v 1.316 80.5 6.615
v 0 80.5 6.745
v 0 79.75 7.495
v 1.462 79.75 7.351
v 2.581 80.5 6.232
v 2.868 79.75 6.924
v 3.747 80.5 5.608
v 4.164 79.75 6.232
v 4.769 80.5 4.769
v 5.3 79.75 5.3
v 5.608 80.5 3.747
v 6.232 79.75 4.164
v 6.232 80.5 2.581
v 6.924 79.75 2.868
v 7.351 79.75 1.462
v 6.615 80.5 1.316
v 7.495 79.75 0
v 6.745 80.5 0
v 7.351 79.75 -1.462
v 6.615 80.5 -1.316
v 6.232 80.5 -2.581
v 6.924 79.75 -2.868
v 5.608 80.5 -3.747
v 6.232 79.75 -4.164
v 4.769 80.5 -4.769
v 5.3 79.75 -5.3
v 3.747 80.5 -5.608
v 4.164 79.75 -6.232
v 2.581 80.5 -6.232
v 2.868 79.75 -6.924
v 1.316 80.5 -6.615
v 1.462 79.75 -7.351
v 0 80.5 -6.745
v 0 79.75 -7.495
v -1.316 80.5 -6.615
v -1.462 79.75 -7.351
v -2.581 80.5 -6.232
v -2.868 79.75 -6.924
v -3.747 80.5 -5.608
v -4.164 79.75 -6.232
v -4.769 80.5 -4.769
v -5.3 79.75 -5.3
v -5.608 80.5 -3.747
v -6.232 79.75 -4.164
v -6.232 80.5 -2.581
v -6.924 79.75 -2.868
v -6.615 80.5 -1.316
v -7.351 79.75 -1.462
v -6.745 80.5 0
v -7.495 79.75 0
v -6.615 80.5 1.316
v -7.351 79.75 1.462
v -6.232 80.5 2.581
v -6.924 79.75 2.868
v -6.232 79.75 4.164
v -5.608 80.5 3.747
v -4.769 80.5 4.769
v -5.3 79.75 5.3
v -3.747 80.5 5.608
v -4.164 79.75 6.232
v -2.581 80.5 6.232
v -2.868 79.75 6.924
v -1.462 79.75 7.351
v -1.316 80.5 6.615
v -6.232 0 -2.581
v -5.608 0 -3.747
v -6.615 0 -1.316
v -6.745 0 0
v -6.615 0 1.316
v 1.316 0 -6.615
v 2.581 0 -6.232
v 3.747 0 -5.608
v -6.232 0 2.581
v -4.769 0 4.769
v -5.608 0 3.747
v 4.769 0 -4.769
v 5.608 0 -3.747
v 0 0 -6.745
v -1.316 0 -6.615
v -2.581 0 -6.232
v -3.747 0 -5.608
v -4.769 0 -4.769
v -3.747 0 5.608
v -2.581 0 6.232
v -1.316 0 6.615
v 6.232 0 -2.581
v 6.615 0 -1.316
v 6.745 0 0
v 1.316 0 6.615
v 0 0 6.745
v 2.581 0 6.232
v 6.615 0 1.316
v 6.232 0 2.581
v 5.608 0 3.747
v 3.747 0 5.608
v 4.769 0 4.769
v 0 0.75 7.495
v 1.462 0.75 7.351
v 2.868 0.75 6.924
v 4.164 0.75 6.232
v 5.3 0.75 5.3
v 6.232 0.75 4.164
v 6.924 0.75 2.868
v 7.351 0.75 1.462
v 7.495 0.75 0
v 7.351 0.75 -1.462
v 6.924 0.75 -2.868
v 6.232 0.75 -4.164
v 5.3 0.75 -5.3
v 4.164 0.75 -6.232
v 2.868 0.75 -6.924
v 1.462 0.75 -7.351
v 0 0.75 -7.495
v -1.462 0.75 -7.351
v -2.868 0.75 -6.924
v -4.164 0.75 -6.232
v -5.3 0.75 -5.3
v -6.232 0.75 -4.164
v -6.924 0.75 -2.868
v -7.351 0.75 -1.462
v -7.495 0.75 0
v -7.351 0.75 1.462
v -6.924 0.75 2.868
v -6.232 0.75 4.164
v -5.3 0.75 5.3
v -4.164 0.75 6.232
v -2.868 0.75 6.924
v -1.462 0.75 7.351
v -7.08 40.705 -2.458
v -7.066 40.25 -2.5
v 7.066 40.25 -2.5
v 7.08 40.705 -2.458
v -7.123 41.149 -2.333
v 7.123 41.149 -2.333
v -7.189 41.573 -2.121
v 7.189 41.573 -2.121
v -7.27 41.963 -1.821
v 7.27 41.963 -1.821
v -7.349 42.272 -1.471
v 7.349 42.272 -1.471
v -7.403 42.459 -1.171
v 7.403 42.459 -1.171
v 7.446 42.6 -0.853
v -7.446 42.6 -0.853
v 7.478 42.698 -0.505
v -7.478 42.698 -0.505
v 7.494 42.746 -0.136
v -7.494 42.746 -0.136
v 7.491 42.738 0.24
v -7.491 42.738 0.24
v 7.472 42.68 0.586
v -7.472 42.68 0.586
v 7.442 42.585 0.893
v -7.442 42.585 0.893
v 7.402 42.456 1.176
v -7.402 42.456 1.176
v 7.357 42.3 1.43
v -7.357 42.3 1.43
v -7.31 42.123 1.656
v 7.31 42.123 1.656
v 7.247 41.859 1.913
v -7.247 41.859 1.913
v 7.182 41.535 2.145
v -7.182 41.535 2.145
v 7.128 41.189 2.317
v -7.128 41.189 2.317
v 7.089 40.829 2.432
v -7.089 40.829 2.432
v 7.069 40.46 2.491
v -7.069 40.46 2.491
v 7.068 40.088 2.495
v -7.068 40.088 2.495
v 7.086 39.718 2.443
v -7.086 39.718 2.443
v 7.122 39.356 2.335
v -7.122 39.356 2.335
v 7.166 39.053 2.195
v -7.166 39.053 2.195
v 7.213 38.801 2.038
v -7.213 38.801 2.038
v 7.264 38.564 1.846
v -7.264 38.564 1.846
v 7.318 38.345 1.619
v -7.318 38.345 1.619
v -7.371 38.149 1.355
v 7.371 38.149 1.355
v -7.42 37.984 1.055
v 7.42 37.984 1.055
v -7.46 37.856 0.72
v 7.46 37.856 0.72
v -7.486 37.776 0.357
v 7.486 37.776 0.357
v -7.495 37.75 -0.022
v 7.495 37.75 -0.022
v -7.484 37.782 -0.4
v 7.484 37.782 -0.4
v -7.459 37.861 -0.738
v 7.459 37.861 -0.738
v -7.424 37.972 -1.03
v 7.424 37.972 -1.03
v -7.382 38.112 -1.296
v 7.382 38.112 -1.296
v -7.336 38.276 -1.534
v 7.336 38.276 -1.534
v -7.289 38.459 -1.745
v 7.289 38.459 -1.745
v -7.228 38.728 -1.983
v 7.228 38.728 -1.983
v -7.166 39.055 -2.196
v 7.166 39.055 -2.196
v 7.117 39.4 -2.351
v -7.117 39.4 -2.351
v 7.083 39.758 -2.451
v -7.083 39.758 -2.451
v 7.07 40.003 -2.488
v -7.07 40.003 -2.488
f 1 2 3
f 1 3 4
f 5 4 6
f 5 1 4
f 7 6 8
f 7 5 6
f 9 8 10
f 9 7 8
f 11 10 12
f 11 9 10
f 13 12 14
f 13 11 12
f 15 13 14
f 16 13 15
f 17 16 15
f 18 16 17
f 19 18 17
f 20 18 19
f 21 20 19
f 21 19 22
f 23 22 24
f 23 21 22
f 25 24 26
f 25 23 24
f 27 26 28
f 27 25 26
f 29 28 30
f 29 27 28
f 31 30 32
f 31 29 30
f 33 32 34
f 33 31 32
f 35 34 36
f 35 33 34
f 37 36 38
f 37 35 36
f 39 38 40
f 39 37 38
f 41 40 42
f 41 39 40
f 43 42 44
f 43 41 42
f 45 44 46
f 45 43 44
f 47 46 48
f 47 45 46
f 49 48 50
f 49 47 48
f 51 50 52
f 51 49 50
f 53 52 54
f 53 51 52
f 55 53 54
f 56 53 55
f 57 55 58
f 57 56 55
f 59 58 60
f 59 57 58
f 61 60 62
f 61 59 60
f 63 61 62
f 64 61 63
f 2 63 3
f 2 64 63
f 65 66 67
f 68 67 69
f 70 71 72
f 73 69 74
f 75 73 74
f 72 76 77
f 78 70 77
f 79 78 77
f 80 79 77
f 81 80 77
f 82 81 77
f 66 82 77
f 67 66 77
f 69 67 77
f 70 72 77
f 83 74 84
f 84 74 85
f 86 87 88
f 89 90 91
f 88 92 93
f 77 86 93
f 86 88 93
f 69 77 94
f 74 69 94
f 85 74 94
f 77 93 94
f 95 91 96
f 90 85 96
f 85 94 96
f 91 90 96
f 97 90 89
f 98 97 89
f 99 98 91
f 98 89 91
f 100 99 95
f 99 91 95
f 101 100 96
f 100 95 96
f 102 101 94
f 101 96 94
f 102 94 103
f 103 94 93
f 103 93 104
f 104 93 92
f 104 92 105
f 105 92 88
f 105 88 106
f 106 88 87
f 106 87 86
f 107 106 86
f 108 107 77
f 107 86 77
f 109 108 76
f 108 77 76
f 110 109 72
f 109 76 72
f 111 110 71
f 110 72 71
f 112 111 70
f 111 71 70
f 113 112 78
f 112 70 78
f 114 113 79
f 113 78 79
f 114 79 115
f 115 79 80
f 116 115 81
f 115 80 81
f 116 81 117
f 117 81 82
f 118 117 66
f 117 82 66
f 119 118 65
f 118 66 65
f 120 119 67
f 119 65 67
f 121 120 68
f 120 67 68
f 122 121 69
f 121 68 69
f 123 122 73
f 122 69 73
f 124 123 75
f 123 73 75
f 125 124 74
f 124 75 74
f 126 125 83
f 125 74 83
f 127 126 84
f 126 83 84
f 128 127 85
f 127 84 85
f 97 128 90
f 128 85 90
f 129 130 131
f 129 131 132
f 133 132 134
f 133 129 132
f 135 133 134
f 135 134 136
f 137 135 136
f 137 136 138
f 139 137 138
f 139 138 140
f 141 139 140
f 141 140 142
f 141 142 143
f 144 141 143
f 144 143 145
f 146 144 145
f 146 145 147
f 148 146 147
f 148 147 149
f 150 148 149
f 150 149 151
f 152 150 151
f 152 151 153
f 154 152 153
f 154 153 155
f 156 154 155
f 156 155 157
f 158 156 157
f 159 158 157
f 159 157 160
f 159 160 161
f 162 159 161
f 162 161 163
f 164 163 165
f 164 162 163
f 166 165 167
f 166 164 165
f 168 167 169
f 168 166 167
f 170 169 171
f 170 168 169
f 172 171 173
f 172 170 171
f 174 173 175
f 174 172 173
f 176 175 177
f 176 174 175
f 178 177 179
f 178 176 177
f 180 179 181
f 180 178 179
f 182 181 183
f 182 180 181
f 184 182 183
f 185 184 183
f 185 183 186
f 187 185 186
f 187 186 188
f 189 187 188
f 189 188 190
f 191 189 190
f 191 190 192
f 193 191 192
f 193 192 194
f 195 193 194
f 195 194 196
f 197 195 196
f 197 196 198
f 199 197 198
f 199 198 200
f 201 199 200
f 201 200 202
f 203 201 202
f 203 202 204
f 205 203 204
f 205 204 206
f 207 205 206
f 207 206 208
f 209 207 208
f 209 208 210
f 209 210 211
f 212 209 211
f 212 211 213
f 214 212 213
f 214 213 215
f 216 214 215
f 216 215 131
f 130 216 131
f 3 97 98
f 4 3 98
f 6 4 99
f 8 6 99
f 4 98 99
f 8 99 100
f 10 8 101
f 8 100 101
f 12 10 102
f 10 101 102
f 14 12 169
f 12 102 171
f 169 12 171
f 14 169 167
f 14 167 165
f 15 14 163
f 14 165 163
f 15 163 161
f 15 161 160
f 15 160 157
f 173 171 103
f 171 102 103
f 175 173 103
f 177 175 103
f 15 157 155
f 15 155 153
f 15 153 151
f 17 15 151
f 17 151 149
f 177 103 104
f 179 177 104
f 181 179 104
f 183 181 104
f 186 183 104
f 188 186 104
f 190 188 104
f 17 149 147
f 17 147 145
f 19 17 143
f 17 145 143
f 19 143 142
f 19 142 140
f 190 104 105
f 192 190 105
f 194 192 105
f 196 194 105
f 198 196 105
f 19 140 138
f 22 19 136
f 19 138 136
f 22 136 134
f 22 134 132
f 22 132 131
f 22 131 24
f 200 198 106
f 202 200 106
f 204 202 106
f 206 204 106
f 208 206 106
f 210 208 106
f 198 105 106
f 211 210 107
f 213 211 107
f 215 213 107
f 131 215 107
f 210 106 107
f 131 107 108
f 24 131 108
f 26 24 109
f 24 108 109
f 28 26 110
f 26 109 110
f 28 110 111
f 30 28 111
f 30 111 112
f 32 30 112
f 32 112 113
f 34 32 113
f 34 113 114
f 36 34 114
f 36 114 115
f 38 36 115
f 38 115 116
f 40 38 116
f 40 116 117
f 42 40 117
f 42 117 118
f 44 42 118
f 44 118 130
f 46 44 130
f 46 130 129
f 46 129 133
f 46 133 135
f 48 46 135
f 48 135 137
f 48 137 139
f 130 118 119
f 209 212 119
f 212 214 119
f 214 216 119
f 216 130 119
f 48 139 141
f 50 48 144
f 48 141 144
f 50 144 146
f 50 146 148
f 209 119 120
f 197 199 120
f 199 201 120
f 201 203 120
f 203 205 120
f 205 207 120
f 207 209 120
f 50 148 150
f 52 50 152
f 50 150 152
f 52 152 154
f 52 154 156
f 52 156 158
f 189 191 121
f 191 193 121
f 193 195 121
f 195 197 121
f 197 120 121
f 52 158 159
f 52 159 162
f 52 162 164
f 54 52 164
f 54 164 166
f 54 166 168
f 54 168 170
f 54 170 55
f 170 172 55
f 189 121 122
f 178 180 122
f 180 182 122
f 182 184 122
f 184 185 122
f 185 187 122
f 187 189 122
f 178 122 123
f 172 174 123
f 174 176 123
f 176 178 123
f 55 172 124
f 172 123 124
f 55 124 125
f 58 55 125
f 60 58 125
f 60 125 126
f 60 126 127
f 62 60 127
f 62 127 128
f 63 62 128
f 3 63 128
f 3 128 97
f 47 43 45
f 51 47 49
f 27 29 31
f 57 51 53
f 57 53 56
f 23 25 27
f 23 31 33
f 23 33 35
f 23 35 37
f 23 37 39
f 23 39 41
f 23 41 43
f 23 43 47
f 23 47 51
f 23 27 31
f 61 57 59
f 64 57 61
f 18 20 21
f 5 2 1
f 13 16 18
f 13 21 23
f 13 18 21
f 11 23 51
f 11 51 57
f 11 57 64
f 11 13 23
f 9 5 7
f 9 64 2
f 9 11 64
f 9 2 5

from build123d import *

# Parameters (mm, degrees)
SKETCH1_R               = 7.495
BOSS_EXTRUDE1_DEPTH     = 80.5
CUT_EXTRUDE1_DEPTH      = 82.194827729
CUT_EXTRUDE1_DEPTH_BACK = 82.194827729
SKETCH2_R               = 2.5
CHAMFER1_SIZE           = 0.75


with BuildPart() as part:
    # Sketch1 → Boss-Extrude1 (new body)
    with BuildSketch(Plane(origin=(0, 0, 0), x_dir=(1, 0, 0), z_dir=(0, 1, 0))):
        with Locations(Location((0, 0, 0), (0, 0, 270))):
            Circle(SKETCH1_R)
    extrude(amount=BOSS_EXTRUDE1_DEPTH)

    # Sketch2 → Cut-Extrude1 (cut, two sides: drawn at the far end of the back side and taken through both)
    with BuildSketch(Plane(origin=(0, 0, 0), x_dir=(0, 0, -1), z_dir=(1, 0, 0)).offset(-CUT_EXTRUDE1_DEPTH_BACK)):
        with Locations((0, 40.25)):
            Circle(SKETCH2_R)
    extrude(amount=CUT_EXTRUDE1_DEPTH + CUT_EXTRUDE1_DEPTH_BACK, mode=Mode.SUBTRACT)

    # Chamfer1
    chamfer1_edges = [part.edges().sort_by_distance(p)[0] for p in [
        (0, 0, -7.495),
        (0, 80.5, -7.495),
    ]]
    chamfer(chamfer1_edges, length=CHAMFER1_SIZE)


solid = part.part
